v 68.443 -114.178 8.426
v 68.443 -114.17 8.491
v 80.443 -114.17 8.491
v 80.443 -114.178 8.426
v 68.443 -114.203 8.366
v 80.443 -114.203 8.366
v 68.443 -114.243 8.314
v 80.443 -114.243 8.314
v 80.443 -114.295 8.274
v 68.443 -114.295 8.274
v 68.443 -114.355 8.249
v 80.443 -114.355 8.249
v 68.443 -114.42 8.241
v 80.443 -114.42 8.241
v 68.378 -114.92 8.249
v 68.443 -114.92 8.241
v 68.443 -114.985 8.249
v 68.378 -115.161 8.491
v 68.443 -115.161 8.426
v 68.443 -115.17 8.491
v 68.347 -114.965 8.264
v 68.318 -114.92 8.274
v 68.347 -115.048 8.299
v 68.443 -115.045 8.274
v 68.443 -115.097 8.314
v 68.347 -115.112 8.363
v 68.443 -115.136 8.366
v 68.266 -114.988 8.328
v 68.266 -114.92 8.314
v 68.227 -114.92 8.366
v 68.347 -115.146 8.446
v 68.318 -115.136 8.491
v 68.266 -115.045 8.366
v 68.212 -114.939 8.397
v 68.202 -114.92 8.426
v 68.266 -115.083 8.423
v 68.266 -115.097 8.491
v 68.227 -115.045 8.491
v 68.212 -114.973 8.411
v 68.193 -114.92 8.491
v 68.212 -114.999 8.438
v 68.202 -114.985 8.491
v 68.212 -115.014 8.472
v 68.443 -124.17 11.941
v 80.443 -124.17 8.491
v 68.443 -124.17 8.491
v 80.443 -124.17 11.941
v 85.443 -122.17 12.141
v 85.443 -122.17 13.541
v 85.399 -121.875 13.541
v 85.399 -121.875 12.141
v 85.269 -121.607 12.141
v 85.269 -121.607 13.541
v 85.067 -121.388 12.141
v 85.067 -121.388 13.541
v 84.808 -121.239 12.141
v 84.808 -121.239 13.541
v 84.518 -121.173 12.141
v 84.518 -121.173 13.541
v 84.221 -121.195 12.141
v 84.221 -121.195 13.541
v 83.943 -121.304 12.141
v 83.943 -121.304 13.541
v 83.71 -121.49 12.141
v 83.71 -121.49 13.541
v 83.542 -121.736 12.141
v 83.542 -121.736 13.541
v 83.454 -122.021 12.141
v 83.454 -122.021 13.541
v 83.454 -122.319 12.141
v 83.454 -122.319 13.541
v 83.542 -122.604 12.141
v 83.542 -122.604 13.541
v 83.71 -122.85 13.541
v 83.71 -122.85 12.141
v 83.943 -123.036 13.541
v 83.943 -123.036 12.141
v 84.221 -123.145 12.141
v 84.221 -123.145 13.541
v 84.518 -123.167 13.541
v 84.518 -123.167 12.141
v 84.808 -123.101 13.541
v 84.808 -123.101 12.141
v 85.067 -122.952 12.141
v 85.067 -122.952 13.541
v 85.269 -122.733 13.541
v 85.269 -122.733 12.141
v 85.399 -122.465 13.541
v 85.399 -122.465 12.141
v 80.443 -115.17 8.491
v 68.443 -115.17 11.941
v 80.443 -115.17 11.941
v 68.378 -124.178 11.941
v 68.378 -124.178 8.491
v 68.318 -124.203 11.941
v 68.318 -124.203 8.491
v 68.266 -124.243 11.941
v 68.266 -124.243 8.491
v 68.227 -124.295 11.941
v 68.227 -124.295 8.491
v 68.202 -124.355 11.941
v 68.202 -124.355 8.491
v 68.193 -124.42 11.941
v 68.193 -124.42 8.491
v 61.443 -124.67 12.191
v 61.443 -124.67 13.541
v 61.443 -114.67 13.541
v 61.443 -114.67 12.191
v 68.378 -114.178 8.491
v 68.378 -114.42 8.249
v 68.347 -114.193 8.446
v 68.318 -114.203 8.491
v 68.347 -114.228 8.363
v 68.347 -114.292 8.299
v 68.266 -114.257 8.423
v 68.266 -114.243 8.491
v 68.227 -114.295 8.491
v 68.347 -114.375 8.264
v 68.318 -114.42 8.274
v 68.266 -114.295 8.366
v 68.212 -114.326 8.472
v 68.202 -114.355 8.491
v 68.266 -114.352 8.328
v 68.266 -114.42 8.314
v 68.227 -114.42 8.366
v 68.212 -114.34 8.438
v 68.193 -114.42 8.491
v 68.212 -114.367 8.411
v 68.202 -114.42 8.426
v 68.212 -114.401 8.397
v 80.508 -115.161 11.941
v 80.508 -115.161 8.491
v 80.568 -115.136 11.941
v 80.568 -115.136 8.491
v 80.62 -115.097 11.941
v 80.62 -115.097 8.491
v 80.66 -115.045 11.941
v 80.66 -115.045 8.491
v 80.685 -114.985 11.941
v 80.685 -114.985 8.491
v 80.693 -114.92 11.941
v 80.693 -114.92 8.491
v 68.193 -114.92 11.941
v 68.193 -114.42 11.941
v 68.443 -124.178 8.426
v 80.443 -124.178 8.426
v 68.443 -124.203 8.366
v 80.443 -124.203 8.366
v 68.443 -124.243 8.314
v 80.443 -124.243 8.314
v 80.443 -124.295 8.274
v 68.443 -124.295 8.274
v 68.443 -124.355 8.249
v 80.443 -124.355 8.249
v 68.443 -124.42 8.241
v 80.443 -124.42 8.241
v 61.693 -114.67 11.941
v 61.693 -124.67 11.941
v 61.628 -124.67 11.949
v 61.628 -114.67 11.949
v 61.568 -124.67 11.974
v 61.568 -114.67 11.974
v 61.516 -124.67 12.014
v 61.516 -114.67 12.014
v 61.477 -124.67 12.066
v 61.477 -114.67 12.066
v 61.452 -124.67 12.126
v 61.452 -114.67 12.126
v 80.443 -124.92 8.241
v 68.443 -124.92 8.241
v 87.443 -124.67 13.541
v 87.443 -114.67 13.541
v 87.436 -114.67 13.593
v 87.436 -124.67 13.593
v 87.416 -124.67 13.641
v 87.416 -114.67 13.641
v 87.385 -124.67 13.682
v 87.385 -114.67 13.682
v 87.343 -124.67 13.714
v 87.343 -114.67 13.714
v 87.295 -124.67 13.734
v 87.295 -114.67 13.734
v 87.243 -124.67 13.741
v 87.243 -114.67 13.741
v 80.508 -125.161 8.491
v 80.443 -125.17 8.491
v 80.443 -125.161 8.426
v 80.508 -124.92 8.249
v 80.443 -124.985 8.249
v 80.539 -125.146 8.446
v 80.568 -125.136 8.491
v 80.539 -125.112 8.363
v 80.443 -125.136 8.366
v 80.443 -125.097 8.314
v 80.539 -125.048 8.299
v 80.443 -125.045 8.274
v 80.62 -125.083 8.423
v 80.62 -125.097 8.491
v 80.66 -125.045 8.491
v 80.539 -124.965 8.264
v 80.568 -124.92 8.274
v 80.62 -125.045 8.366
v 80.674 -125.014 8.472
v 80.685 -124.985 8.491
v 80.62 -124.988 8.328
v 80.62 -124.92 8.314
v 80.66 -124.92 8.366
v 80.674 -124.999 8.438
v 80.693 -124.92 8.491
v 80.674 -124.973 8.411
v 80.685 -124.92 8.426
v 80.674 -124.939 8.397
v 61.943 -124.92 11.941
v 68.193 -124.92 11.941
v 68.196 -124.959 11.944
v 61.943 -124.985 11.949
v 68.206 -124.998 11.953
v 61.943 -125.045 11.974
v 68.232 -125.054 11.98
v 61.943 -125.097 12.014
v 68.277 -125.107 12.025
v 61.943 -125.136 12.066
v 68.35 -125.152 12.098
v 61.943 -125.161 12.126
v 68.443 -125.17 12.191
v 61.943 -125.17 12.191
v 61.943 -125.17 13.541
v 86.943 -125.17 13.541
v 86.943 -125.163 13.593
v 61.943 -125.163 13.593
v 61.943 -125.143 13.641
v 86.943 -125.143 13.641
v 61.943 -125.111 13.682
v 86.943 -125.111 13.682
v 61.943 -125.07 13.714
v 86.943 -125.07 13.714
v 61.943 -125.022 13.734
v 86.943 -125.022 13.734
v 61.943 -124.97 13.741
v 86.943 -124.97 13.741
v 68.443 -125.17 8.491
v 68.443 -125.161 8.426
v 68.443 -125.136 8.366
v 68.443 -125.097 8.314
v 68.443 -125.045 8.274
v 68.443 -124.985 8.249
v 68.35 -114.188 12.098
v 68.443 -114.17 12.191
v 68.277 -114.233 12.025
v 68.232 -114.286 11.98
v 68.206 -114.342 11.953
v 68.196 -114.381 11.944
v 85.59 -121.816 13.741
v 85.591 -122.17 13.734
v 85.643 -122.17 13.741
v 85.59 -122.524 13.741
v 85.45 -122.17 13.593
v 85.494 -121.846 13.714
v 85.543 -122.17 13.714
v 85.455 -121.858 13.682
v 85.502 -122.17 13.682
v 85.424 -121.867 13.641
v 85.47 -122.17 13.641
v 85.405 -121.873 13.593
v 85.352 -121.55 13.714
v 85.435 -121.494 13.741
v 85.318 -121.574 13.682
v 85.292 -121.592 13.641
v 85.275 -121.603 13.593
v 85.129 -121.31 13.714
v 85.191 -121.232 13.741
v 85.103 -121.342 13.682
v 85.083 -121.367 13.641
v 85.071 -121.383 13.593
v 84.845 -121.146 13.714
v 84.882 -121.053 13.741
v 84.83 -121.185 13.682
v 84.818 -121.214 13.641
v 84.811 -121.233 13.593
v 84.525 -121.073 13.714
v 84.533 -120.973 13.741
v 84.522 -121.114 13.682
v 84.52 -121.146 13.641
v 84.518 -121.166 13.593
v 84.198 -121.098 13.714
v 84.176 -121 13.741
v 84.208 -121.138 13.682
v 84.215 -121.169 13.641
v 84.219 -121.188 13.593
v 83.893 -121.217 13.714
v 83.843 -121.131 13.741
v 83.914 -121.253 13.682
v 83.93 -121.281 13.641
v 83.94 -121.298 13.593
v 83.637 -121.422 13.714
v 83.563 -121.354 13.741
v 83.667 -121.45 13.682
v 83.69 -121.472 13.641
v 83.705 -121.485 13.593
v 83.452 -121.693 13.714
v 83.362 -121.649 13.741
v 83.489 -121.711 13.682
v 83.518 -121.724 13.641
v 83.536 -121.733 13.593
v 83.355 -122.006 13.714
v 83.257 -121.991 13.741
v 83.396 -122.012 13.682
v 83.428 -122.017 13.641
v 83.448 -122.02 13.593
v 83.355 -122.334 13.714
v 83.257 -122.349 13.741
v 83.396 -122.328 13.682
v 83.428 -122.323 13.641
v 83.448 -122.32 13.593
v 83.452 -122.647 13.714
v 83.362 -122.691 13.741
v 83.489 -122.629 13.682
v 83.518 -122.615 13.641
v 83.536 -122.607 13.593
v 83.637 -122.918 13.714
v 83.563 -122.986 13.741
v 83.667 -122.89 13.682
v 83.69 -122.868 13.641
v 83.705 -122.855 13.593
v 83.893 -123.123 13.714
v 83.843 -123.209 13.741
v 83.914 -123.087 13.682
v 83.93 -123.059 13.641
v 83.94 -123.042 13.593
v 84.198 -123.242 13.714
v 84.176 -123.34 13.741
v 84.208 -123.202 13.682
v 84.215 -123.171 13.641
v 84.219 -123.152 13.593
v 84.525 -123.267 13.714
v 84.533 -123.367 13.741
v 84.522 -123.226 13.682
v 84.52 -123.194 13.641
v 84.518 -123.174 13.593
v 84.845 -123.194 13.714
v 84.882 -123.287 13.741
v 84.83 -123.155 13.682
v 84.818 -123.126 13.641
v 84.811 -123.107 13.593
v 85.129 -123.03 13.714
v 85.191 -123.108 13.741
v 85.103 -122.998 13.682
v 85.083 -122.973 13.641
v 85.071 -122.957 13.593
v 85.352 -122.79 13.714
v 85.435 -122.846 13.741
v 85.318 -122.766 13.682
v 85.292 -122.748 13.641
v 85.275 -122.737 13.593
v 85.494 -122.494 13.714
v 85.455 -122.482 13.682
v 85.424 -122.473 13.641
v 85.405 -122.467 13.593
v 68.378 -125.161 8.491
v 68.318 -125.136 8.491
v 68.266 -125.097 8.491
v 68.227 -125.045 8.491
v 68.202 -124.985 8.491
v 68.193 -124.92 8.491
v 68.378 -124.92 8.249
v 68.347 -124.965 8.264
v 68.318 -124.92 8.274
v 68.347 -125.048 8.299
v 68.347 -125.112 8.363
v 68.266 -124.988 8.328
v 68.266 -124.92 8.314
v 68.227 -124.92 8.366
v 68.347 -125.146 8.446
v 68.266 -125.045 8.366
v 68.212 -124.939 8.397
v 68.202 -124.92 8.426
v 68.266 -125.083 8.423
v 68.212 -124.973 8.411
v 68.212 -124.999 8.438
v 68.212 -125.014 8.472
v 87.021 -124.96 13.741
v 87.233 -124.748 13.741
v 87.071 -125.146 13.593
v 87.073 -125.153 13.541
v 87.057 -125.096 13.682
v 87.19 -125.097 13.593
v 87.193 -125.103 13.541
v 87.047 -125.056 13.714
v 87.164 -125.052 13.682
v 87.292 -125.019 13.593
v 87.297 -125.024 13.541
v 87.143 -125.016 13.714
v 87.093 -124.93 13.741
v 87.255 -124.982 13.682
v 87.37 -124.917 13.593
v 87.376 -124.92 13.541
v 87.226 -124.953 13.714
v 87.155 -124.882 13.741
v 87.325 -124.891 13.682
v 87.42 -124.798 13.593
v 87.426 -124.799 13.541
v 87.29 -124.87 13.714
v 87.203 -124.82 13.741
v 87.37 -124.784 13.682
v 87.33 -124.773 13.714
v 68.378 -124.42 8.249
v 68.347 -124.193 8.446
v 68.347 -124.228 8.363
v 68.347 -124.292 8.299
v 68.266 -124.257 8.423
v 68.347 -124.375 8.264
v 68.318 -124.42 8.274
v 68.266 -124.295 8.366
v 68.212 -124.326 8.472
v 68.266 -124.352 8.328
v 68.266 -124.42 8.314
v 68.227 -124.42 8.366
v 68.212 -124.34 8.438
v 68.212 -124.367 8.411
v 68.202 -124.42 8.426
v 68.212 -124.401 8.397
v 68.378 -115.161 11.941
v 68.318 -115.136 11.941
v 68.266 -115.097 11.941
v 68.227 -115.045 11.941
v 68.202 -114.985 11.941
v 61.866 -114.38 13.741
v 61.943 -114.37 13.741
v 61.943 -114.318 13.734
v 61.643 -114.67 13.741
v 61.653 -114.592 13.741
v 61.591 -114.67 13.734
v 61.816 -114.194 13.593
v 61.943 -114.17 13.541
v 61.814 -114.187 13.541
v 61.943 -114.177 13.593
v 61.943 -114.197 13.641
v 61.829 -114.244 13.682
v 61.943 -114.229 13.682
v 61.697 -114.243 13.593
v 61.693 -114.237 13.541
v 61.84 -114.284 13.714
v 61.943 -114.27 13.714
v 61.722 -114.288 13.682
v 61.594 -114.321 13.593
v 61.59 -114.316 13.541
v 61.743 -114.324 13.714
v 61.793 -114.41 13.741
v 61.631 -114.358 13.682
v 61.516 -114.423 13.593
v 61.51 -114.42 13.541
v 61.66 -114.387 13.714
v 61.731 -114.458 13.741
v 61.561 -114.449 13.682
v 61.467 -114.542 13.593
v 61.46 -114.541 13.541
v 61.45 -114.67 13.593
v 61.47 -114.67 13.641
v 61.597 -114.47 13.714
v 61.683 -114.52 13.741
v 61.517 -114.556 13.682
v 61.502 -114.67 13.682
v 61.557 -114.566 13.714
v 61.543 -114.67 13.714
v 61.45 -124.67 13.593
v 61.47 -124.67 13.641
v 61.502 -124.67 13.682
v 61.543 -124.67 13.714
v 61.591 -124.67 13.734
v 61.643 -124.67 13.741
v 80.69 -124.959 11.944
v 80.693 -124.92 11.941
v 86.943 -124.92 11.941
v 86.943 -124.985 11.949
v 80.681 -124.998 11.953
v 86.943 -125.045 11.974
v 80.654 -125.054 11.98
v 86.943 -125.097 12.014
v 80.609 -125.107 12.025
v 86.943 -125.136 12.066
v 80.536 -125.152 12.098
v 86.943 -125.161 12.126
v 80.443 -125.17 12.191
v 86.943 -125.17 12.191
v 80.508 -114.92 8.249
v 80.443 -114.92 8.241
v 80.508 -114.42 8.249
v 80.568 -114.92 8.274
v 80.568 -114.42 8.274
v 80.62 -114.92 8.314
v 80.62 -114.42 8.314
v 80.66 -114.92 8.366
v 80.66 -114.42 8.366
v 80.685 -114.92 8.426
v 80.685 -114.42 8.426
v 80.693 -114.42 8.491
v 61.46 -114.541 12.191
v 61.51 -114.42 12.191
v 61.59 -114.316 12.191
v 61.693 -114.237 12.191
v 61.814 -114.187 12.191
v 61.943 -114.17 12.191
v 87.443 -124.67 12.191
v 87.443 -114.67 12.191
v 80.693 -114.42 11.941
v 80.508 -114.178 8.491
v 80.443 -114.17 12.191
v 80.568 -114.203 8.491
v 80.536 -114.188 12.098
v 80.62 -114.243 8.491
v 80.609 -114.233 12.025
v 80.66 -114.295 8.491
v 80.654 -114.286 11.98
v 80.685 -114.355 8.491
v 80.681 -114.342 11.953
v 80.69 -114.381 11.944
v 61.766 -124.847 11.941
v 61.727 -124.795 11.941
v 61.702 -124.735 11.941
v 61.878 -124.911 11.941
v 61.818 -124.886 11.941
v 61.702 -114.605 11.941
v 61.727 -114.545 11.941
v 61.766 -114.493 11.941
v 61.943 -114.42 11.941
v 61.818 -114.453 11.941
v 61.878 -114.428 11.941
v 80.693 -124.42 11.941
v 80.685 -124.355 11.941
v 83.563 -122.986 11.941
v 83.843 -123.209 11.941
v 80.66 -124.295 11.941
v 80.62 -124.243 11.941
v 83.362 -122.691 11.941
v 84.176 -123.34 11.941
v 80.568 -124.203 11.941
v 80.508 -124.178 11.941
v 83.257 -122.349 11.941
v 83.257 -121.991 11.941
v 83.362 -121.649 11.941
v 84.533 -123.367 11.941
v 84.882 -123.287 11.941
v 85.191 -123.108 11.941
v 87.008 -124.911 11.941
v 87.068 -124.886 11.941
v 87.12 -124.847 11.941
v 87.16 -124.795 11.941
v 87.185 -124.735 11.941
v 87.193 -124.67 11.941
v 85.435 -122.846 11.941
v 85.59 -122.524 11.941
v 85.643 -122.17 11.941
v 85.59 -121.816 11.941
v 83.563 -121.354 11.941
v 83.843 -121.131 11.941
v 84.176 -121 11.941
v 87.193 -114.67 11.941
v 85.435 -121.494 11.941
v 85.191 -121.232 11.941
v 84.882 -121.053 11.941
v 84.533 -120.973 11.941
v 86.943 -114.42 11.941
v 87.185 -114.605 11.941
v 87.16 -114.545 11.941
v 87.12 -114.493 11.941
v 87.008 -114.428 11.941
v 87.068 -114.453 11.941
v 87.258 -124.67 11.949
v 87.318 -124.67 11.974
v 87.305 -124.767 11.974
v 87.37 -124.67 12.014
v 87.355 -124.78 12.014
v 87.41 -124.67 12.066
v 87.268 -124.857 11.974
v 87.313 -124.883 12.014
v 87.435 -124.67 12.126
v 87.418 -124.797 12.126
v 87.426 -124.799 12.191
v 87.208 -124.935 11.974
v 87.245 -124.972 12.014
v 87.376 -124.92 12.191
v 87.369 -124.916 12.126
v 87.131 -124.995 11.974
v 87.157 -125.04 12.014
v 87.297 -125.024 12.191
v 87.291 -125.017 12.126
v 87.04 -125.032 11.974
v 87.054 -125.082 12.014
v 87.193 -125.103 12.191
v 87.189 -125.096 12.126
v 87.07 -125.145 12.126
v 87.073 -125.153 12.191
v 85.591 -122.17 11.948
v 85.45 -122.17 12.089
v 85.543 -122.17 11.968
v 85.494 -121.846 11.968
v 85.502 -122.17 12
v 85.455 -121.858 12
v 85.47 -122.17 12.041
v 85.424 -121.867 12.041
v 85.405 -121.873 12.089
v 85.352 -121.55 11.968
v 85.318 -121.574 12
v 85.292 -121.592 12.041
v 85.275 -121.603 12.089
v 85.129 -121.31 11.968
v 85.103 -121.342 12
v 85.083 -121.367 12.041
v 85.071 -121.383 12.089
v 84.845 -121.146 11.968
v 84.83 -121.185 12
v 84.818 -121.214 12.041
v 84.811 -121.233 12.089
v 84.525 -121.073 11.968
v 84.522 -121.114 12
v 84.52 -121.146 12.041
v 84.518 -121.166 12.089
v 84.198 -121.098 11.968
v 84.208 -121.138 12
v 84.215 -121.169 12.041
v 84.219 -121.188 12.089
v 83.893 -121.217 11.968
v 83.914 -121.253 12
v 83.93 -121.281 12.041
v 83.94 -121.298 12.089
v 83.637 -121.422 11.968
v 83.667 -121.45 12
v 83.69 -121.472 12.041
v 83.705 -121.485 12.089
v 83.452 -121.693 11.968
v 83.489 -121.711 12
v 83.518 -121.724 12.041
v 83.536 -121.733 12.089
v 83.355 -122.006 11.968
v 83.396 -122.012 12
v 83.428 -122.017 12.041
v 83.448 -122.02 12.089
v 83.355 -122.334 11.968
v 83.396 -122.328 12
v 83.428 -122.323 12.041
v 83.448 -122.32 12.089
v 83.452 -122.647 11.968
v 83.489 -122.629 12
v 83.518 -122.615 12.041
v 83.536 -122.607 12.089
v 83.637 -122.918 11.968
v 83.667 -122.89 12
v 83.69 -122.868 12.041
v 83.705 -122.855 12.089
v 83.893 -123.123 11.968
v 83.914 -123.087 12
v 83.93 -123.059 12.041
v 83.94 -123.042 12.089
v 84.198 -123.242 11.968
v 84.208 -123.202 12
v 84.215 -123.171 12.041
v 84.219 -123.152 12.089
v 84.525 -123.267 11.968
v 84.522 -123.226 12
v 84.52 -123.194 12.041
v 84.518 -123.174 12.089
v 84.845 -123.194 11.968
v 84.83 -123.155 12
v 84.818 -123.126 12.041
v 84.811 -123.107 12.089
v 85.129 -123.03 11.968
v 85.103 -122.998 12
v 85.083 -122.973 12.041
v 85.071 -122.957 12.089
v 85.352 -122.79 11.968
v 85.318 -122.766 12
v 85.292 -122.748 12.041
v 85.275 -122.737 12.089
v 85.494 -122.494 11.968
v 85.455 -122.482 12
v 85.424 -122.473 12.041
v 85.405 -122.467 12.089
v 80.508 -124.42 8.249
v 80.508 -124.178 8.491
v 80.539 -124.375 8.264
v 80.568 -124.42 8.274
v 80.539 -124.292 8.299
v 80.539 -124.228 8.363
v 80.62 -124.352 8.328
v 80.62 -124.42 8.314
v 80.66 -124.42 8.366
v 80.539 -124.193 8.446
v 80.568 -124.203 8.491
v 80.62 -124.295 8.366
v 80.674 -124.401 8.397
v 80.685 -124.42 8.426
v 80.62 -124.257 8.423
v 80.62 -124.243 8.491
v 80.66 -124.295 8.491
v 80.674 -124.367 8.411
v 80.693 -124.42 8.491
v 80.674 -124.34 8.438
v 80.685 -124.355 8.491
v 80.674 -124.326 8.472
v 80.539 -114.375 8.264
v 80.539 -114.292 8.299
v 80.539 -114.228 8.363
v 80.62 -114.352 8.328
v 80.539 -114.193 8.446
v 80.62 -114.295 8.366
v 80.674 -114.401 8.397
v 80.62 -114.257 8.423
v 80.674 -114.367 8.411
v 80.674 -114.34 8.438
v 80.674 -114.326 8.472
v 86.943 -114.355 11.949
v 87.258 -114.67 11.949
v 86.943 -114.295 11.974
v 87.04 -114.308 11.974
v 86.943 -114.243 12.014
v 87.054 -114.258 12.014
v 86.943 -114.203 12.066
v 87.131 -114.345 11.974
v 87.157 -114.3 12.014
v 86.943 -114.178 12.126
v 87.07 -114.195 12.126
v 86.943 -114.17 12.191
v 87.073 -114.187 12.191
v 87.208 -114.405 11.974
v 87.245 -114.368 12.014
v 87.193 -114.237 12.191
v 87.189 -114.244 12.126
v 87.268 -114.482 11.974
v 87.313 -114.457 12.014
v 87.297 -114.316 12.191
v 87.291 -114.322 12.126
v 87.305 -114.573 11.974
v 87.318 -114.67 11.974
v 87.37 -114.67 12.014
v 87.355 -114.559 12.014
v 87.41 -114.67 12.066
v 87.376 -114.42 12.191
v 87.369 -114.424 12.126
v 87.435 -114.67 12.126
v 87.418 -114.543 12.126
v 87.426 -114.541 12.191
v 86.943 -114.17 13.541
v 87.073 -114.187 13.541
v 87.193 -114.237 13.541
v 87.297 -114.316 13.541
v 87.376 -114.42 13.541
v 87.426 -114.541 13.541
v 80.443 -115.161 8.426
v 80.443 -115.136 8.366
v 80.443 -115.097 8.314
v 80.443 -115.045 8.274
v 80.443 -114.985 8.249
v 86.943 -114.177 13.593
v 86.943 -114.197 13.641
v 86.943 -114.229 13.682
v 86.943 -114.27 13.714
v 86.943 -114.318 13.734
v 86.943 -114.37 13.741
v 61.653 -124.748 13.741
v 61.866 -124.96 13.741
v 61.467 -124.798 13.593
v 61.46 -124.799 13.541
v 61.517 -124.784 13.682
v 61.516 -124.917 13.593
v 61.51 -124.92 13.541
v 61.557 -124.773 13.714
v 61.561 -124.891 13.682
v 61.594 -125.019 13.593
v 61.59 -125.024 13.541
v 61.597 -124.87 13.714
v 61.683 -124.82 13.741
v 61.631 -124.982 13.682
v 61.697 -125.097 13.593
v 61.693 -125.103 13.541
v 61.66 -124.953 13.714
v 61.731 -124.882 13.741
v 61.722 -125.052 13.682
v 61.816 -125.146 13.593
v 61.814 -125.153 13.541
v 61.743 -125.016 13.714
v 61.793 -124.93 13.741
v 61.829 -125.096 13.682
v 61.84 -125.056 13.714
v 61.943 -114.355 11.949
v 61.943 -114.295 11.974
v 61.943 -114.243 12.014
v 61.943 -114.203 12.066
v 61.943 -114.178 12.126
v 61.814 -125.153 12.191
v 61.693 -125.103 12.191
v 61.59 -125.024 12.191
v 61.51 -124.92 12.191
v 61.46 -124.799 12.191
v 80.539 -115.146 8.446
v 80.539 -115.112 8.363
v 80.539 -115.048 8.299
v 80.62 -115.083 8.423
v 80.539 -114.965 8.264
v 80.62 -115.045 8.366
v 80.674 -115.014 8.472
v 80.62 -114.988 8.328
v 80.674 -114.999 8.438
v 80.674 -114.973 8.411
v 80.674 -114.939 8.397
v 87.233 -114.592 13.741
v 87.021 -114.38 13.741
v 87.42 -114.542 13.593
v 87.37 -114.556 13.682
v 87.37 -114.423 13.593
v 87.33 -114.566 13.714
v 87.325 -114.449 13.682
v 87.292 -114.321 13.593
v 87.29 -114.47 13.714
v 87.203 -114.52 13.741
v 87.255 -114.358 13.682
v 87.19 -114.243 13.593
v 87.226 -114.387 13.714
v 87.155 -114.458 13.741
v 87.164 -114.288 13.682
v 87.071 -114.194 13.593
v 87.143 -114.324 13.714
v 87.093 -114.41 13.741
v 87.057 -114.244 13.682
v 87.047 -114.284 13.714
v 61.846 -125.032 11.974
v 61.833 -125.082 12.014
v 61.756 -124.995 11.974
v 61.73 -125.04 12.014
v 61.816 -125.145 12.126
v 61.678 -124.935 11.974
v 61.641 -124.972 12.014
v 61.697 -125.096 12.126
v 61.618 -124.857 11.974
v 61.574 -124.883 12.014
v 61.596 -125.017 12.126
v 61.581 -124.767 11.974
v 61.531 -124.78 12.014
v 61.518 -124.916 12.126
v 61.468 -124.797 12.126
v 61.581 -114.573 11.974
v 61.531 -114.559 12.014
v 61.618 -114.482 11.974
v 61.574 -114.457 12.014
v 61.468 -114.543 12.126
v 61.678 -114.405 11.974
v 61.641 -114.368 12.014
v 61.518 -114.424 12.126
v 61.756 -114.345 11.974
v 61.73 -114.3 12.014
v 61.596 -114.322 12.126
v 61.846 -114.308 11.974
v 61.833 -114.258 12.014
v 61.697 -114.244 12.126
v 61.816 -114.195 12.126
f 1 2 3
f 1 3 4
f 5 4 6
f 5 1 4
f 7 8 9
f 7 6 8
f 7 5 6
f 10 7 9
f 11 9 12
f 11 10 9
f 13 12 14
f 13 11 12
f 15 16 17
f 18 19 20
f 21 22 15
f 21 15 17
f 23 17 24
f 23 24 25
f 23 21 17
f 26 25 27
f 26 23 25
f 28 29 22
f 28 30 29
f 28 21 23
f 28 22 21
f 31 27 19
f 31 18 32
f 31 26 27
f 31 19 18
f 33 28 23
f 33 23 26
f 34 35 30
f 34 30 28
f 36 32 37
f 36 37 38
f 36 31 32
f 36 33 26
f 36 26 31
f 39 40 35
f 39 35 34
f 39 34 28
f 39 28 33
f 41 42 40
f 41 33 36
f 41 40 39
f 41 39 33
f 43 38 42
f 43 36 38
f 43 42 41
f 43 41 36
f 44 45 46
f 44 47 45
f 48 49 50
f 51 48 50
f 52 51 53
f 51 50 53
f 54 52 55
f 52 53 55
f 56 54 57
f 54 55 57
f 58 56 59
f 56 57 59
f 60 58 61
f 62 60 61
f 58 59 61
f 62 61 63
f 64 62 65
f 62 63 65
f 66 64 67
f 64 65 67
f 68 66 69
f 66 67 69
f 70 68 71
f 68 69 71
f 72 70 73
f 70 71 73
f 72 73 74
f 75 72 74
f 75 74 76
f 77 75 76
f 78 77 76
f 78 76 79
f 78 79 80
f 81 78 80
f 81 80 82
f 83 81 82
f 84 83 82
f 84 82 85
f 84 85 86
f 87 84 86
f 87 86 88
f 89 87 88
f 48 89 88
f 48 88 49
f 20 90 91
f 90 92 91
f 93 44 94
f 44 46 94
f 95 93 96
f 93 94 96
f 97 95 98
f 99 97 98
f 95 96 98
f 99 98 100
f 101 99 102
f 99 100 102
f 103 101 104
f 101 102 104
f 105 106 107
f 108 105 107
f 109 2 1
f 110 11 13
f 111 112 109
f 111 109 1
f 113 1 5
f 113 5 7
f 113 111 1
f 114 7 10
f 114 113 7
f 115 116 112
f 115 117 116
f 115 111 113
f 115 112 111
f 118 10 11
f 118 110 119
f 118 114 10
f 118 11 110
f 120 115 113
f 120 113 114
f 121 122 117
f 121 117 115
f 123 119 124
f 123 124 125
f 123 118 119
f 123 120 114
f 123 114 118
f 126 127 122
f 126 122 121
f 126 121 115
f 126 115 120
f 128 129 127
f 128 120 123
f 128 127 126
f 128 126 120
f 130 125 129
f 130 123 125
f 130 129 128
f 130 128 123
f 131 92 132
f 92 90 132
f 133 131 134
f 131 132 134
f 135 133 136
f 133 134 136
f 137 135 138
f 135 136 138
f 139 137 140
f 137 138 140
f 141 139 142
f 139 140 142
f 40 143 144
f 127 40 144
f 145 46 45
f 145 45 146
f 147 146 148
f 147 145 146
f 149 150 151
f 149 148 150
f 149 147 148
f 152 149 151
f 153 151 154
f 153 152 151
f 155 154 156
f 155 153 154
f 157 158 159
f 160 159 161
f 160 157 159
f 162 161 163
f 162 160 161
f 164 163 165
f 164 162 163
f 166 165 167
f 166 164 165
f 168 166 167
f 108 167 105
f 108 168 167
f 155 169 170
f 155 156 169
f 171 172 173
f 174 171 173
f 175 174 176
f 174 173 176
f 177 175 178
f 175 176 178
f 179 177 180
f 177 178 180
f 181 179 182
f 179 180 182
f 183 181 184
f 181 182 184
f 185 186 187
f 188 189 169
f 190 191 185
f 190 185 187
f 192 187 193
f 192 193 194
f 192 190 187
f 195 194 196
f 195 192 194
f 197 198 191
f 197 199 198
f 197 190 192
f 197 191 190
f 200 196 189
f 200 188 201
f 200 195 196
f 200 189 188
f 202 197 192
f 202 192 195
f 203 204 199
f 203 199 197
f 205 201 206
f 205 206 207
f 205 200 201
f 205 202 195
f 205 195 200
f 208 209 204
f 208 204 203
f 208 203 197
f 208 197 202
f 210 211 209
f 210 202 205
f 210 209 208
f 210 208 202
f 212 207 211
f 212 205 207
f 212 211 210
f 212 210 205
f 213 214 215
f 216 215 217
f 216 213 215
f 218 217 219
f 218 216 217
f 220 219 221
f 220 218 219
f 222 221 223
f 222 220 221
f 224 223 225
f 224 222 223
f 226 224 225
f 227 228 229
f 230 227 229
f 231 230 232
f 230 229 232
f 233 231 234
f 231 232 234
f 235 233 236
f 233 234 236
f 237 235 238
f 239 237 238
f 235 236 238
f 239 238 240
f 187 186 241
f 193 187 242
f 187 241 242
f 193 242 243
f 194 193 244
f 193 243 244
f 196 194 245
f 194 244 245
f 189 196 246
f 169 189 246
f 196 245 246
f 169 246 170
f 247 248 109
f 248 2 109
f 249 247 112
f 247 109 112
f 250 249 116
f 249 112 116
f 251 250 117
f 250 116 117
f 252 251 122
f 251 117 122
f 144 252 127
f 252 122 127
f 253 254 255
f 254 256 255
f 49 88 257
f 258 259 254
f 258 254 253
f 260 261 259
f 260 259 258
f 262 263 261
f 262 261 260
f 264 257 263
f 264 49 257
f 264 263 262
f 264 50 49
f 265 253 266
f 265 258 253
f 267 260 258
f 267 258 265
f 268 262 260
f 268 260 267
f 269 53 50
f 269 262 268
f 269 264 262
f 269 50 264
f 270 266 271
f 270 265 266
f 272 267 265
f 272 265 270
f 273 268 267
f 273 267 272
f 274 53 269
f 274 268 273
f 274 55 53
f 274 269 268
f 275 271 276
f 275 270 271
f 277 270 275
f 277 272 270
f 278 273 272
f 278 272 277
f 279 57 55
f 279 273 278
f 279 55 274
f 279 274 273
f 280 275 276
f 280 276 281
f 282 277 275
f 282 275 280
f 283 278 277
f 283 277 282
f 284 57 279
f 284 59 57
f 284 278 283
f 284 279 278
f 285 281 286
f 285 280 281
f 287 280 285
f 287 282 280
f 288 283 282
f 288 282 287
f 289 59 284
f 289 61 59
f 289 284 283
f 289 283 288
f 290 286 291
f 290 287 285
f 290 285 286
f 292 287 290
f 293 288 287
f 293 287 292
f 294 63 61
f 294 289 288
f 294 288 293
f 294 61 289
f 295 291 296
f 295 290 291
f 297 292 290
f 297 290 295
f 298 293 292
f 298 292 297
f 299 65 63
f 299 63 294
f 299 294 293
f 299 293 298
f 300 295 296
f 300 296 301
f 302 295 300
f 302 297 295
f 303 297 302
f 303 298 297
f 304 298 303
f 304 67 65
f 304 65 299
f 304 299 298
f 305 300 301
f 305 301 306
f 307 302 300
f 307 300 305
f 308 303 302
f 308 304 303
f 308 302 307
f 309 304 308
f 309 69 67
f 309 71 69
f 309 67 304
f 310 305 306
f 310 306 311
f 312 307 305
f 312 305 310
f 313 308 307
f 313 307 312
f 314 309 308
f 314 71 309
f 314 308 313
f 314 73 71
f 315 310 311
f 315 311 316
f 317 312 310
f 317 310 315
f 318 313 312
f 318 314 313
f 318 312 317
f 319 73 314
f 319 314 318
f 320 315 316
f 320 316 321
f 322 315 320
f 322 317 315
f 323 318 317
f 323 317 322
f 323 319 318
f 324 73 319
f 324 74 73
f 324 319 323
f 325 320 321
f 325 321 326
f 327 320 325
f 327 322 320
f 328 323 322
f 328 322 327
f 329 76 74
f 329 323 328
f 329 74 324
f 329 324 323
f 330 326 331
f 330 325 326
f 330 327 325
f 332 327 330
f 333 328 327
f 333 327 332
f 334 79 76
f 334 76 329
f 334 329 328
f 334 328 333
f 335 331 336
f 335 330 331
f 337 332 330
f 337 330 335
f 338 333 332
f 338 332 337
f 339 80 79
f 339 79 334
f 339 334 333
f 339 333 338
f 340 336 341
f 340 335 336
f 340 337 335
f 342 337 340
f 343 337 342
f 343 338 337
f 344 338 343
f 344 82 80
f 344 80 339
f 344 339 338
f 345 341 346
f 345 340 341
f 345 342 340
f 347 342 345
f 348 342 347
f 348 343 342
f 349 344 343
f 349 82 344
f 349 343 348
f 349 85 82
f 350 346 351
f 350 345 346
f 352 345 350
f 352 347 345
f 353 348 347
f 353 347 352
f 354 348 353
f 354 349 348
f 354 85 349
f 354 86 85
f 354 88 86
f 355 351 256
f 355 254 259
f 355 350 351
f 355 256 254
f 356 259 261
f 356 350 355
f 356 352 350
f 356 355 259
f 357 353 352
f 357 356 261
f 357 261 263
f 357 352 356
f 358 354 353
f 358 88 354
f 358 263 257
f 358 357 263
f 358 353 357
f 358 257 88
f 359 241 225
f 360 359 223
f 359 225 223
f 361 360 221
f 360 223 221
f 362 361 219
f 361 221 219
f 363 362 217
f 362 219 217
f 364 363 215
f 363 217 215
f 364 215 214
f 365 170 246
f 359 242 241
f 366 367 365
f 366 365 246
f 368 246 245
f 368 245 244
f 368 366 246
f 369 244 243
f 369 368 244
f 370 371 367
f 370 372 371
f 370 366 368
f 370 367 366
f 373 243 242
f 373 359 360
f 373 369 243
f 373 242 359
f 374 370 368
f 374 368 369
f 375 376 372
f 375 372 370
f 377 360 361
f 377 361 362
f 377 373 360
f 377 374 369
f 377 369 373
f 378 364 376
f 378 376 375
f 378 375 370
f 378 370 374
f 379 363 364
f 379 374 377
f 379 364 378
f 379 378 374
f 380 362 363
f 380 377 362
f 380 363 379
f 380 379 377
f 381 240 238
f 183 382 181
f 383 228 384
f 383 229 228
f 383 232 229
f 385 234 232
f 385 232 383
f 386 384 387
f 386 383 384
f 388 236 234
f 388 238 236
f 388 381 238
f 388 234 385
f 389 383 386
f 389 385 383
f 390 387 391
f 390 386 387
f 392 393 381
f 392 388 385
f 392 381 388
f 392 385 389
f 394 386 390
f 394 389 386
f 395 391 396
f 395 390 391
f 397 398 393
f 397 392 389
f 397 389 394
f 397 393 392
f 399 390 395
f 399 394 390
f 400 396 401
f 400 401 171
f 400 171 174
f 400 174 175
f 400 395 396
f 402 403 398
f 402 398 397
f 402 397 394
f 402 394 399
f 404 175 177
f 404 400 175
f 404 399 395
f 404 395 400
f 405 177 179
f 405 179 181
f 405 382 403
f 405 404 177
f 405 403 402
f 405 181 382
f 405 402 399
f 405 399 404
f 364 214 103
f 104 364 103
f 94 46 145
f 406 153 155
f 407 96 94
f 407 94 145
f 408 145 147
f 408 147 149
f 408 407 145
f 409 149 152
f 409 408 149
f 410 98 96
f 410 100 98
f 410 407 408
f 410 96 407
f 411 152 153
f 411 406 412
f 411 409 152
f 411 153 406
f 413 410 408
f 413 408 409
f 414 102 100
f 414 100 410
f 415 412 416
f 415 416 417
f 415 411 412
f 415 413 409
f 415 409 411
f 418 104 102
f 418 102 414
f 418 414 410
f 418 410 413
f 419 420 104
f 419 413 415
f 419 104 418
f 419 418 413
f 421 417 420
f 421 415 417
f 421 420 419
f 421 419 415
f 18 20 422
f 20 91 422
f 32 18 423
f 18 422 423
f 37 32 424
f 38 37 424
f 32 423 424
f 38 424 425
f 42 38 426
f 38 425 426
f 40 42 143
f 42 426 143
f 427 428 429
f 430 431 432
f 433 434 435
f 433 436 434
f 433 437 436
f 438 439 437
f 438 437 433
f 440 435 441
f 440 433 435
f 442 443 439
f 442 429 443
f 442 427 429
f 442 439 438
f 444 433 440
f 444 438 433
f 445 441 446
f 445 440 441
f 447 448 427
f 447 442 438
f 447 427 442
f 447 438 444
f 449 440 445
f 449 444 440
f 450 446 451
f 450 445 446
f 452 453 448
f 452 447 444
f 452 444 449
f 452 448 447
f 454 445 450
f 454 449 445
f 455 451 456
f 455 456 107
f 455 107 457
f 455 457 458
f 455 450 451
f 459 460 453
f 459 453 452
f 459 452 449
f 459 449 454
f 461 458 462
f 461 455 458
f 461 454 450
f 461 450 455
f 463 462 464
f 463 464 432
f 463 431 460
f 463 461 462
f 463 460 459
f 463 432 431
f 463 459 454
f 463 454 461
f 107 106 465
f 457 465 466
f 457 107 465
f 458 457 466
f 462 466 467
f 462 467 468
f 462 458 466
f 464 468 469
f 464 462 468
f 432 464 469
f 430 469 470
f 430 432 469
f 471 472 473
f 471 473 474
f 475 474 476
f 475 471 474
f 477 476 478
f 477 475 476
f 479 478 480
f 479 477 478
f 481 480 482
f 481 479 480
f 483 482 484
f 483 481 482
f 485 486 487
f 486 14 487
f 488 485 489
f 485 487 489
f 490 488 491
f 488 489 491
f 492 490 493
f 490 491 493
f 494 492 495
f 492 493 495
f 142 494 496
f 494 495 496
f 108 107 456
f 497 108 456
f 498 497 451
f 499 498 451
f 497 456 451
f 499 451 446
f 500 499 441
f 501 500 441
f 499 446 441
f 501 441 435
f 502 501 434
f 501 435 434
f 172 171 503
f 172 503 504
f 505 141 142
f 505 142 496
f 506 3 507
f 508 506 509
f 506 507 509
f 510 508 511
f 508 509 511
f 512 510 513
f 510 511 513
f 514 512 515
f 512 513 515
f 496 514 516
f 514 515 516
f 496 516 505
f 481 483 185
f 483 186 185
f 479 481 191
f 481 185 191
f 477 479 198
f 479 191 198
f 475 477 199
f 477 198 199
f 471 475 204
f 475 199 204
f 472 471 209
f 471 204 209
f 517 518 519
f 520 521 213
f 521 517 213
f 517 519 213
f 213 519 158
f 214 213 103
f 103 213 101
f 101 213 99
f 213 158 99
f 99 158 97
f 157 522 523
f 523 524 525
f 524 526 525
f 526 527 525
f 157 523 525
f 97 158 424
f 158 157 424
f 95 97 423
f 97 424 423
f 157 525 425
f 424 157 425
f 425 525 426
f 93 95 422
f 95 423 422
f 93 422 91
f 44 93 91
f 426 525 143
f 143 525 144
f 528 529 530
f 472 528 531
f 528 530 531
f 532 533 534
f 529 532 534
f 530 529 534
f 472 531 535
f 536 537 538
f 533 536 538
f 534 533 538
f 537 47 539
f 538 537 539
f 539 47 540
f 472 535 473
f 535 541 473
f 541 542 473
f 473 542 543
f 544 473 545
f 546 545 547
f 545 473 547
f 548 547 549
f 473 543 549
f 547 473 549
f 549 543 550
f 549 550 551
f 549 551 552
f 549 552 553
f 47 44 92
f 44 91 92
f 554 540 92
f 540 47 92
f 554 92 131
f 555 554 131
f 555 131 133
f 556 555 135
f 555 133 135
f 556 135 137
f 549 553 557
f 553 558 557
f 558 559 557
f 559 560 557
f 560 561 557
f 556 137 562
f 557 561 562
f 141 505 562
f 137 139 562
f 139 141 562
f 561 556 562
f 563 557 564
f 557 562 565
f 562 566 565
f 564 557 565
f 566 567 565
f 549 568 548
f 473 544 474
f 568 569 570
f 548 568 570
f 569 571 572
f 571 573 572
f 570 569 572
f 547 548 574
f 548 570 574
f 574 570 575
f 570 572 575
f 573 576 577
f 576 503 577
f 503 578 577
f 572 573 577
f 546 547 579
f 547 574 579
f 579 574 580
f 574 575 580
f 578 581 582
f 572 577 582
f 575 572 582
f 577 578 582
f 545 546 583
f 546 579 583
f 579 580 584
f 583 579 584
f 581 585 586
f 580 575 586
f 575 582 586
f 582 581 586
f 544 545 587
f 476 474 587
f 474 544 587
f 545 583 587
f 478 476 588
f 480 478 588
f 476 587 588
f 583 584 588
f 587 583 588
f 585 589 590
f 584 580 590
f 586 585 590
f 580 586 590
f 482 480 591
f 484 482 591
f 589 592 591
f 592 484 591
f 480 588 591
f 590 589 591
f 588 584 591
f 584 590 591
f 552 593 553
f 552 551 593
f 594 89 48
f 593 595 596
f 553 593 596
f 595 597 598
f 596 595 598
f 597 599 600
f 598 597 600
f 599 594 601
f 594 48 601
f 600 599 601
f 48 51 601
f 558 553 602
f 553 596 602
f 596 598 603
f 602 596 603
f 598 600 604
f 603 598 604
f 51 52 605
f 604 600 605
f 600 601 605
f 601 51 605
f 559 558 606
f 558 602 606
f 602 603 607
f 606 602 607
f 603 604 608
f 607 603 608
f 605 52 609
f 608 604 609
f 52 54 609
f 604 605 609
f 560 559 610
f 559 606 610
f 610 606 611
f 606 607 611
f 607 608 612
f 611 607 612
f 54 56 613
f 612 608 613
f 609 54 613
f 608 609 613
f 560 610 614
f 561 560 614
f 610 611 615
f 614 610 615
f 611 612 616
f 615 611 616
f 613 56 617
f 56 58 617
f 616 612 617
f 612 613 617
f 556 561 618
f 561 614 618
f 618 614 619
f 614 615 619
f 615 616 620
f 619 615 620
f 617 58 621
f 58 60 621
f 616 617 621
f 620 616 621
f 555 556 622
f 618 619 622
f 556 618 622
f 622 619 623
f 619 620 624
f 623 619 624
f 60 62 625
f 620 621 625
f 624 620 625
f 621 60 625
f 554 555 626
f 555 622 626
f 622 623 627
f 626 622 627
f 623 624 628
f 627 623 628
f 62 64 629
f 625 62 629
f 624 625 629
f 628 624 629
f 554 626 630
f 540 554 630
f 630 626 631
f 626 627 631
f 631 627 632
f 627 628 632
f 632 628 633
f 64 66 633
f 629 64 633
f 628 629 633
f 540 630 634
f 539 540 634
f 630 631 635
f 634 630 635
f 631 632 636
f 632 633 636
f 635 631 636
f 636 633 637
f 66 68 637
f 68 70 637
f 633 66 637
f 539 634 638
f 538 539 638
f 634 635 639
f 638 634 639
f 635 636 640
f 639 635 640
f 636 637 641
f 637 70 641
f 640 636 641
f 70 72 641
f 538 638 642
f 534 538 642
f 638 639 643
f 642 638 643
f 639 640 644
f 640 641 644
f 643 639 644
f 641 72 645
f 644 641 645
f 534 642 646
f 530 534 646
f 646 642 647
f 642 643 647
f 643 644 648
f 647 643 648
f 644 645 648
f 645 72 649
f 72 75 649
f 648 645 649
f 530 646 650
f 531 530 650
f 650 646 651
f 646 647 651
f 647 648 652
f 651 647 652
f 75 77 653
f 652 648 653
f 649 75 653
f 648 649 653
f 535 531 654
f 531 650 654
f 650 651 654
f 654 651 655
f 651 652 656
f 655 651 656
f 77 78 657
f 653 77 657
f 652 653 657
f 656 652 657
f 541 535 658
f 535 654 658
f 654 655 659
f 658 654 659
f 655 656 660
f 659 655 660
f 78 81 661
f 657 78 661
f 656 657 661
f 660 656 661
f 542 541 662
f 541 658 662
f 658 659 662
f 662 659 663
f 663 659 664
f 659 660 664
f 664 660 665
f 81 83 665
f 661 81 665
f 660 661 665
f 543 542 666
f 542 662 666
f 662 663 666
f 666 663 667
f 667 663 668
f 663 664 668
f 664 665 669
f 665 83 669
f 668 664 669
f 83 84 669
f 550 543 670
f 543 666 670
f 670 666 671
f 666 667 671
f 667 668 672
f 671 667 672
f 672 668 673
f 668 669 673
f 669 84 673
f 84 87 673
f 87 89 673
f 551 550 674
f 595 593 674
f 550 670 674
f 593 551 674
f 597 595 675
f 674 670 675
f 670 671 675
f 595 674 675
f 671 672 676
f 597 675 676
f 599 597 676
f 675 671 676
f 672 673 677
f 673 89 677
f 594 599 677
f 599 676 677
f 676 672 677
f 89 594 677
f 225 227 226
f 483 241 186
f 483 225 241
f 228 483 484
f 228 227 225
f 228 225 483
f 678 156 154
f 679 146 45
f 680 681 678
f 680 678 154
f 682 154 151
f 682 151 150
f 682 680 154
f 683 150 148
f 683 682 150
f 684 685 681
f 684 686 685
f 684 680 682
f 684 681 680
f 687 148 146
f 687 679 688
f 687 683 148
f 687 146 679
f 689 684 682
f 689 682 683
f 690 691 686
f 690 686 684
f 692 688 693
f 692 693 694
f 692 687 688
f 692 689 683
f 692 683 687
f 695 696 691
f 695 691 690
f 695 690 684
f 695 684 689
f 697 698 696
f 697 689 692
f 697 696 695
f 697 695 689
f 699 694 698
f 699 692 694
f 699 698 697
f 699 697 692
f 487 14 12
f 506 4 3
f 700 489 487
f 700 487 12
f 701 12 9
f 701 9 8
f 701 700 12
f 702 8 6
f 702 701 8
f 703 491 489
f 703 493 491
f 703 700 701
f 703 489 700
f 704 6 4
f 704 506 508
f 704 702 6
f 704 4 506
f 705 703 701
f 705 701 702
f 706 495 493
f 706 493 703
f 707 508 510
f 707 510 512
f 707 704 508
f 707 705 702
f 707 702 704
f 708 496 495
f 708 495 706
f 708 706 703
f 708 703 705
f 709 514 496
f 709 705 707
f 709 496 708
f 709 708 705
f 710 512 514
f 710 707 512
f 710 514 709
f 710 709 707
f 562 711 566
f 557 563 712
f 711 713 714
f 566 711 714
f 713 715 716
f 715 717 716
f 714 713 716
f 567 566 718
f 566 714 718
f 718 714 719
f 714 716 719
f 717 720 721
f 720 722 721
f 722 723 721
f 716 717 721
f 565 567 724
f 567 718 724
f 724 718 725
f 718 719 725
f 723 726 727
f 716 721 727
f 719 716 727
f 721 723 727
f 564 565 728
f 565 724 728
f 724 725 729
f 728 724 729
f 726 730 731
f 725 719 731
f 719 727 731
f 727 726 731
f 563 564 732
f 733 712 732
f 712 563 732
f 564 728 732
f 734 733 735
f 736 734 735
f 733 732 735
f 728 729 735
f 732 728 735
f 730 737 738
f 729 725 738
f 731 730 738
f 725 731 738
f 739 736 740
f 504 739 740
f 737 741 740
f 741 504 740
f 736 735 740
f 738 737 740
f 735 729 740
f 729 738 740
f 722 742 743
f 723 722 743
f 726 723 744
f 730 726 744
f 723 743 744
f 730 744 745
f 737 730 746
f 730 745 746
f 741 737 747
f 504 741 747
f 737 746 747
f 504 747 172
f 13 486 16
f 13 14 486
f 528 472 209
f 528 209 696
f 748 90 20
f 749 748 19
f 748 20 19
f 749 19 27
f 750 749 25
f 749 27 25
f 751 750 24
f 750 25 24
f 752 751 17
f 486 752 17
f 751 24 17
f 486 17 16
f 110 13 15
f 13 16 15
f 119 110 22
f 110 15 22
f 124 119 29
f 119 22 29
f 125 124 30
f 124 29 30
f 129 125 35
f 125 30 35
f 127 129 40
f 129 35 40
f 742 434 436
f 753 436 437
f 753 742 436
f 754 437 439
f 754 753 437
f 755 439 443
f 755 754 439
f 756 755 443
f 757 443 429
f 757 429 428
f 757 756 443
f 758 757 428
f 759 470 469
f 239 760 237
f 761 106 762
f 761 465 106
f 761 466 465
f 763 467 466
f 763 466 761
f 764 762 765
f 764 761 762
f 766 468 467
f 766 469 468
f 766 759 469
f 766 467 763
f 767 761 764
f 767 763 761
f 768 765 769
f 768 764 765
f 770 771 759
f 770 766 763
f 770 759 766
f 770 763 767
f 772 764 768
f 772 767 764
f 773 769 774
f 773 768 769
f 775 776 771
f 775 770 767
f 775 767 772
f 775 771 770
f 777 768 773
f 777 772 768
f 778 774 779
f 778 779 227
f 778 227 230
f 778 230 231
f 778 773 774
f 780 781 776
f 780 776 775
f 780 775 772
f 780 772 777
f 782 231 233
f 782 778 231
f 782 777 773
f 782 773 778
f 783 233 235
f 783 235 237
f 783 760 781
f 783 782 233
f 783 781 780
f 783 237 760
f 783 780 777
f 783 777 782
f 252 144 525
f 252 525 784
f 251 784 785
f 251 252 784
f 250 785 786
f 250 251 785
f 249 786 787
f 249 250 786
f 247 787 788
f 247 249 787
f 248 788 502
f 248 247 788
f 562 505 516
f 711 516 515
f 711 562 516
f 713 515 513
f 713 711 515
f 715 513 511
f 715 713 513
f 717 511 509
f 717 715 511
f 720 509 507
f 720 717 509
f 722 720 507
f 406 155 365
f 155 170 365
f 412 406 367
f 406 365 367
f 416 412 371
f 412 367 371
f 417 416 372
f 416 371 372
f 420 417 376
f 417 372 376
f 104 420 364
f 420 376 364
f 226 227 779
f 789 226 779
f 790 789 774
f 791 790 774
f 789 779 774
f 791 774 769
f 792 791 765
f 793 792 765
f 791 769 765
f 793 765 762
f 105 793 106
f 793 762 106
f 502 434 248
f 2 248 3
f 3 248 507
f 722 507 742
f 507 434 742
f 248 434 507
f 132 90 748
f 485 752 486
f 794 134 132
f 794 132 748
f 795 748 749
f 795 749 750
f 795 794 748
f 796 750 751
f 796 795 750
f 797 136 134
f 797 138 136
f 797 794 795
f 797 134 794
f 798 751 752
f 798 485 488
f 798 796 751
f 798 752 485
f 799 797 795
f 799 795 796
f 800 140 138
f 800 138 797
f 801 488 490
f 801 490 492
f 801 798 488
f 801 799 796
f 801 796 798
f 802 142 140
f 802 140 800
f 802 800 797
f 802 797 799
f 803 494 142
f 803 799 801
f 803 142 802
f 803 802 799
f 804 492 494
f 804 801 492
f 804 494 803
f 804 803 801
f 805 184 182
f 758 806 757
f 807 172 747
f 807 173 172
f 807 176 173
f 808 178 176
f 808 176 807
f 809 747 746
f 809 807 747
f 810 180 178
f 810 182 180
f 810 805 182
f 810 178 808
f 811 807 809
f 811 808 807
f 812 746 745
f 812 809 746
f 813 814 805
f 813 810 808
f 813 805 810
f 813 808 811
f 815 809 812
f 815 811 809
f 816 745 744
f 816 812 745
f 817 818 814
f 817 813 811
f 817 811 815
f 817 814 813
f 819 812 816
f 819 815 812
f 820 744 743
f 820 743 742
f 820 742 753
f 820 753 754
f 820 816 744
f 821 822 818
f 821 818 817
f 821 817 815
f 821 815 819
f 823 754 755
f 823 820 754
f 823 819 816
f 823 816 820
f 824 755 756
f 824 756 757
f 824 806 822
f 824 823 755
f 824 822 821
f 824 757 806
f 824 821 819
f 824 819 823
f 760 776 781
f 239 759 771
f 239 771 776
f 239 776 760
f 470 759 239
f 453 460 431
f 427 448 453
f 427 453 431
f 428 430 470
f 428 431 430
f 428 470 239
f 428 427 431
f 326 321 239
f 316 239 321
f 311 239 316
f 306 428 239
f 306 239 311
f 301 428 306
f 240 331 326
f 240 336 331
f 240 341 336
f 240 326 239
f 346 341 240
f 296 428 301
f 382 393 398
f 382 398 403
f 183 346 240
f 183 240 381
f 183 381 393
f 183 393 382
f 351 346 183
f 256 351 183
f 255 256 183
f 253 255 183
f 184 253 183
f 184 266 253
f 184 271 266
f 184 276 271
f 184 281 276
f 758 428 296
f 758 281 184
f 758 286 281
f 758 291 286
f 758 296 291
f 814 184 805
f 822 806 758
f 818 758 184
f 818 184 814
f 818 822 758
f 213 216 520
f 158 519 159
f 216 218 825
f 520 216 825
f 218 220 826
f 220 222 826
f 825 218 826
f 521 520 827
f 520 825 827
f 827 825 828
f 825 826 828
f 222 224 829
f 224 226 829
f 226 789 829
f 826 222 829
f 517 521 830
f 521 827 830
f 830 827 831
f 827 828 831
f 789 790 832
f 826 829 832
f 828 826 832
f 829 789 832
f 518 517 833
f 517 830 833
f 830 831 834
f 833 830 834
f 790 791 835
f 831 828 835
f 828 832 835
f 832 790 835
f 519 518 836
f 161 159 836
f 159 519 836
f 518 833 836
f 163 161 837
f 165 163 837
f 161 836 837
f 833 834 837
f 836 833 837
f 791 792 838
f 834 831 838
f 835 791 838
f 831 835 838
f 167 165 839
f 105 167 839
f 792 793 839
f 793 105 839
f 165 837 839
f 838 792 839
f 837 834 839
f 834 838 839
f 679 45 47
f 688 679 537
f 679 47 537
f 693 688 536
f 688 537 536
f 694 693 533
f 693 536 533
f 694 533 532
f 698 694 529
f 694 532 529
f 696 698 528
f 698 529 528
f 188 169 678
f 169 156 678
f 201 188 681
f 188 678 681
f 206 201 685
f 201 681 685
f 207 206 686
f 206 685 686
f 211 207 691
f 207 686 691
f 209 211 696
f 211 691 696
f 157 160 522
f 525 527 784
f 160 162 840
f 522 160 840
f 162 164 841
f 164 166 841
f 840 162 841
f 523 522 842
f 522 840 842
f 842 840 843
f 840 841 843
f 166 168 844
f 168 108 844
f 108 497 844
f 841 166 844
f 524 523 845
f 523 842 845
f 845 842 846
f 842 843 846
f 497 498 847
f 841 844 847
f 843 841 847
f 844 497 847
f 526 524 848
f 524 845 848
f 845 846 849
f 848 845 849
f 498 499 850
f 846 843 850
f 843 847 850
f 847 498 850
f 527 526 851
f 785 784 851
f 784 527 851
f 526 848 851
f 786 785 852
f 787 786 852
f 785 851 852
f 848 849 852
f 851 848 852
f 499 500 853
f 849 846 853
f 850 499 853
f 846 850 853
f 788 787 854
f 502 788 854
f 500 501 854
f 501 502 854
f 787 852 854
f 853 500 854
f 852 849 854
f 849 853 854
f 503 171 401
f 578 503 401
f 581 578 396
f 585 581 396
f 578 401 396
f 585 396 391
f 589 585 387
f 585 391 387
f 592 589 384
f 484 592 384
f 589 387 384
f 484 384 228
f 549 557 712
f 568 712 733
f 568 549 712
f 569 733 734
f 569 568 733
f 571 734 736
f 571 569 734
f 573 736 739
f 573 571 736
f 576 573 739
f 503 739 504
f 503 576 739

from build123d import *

# Parameters (mm, degrees)
SKETCH1_W           = 26
SKETCH1_H           = 11
BOSS_EXTRUDE1_DEPTH = 1.8
FILLET1_R           = 0.2
SKETCH2_R           = 1
CUT_EXTRUDE1_DEPTH  = 153.699256387
FILLET2_R           = 0.5
FILLET3_R           = 0.2
SKETCH4_W           = 12.5
SKETCH4_H           = 1
BOSS_EXTRUDE2_DEPTH = 3.7
FILLET4_R           = 0.25
FILLET5_R           = 0.25


with BuildPart() as part:
    # Sketch1 → Boss-Extrude1 (new body)
    with BuildSketch(Plane.XY.offset(13.74095281)):
        with Locations((74.443158301, -119.669952335)):
            Rectangle(SKETCH1_W, SKETCH1_H)
    extrude(amount=-BOSS_EXTRUDE1_DEPTH)

    # Fillet1
    fillet1_edges = [part.edges().sort_by_distance(p)[0] for p in [
        (87.443158301, -119.669952335, 13.74095281),
        (74.443158301, -114.169952335, 13.74095281),
        (61.443158301, -119.669952335, 13.74095281),
        (74.443158301, -125.169952335, 13.74095281),
    ]]
    fillet(fillet1_edges, radius=FILLET1_R)

    # Sketch2 → Cut-Extrude1 (cut, through all)
    with BuildSketch(Plane.XY.offset(13.74095281)):
        with Locations((84.443158301, -122.169952335)):
            Circle(SKETCH2_R)
    extrude(amount=-CUT_EXTRUDE1_DEPTH, mode=Mode.SUBTRACT)

    # Fillet2
    # the kernel refuses this fillet: 0.5 mm, written as the material it takes off along each edge
    with BuildSketch(Plane(origin=(86.943158301, -124.669952335, 13.74095281), x_dir=(0, -1, 0), z_dir=(-1, 0, 0))) as fillet2_piece_1:
        with BuildLine():
            CenterArc((0.3, -0.2), 0.2, 0, 90)
            Line((0.5, -0.2), (0.5, 0))
            Line((0.5, 0), (0.3, 0))
        make_face()
    revolve(axis=Axis((86.943158301, -124.669952335, 13.74095281), (0, 0, 1)), revolution_arc=90, mode=Mode.SUBTRACT)
    with BuildSketch(Plane(origin=(61.943158301, -124.669952335, 13.74095281), x_dir=(-1, 0, 0), z_dir=(0, 1, 0))) as fillet2_piece_2:
        with BuildLine():
            CenterArc((0.3, -0.2), 0.2, 0, 90)
            Line((0.5, -0.2), (0.5, 0))
            Line((0.5, 0), (0.3, 0))
        make_face()
    revolve(axis=Axis((61.943158301, -124.669952335, 13.74095281), (0, 0, 1)), revolution_arc=90, mode=Mode.SUBTRACT)
    with BuildSketch(Plane(origin=(86.943158301, -114.669952335, 13.74095281), x_dir=(1, 0, 0), z_dir=(0, -1, 0))) as fillet2_piece_3:
        with BuildLine():
            CenterArc((0.3, -0.2), 0.2, 0, 90)
            Line((0.5, -0.2), (0.5, 0))
            Line((0.5, 0), (0.3, 0))
        make_face()
    revolve(axis=Axis((86.943158301, -114.669952335, 13.74095281), (0, 0, 1)), revolution_arc=90, mode=Mode.SUBTRACT)
    with BuildSketch(Plane(origin=(61.943158301, -114.669952335, 13.74095281), x_dir=(0, 1, 0), z_dir=(1, 0, 0))) as fillet2_piece_4:
        with BuildLine():
            CenterArc((0.3, -0.2), 0.2, 0, 90)
            Line((0.5, -0.2), (0.5, 0))
            Line((0.5, 0), (0.3, 0))
        make_face()
    revolve(axis=Axis((61.943158301, -114.669952335, 13.74095281), (0, 0, 1)), revolution_arc=90, mode=Mode.SUBTRACT)
    with BuildSketch(Plane(origin=(87.443158301, -125.169952335, 13.74095281), x_dir=(-1, 0, 0), z_dir=(0, 0, -1)), Plane(origin=(87.443158301, -114.169952335, 13.74095281), x_dir=(0, -1, 0), z_dir=(0, 0, -1))) as fillet2_piece_5:
        with BuildLine():
            CenterArc((FILLET2_R, FILLET2_R), FILLET2_R, 180, 90)
            Line((0, FILLET2_R), (0, 0))
            Line((0, 0), (FILLET2_R, 0))
        make_face()
    extrude(amount=3.05, mode=Mode.SUBTRACT)
    with BuildSketch(Plane(origin=(61.443158301, -114.169952335, 13.74095281), x_dir=(0, -1, 0), z_dir=(0, 0, -1)), Plane(origin=(61.443158301, -125.169952335, 13.74095281), x_dir=(1, 0, 0), z_dir=(0, 0, -1))) as fillet2_piece_6:
        with BuildLine():
            CenterArc((FILLET2_R, -FILLET2_R), FILLET2_R, 90, 90)
            Line((0, -FILLET2_R), (0, 0))
            Line((0, 0), (FILLET2_R, 0))
        make_face()
    extrude(amount=3.05, mode=Mode.SUBTRACT)

    # Fillet3
    fillet3_edges = [part.edges().sort_by_distance(p)[0] for p in [
        (83.443158301, -122.169952335, 11.94095281),
        (83.443158301, -122.169952335, 13.74095281),
    ]]
    fillet(fillet3_edges, radius=FILLET3_R)

    # Sketch4 → Boss-Extrude2 (add)
    with BuildSketch(Plane(origin=(0, 0, 11.94095281), x_dir=(-1, 0, 0), z_dir=(0, 0, -1))):
        with Locations((-74.443158301, -124.669952335)):
            Rectangle(SKETCH4_W, SKETCH4_H)
        with Locations((-74.443158301, -114.669952335)):
            Rectangle(SKETCH4_W, SKETCH4_H)
    extrude(amount=BOSS_EXTRUDE2_DEPTH)

    # Fillet4
    fillet4_edges = [part.edges().sort_by_distance(p)[0] for p in [
        (61.443158301, -119.669952335, 11.94095281),
        (65.068158301, -125.169952335, 11.94095281),
        (83.818158301, -114.169952335, 11.94095281),
        (87.443158301, -119.669952335, 11.94095281),
        (87.296711691, -125.023505725, 11.94095281),
        (87.296711691, -114.316398944, 11.94095281),
        (61.58960491, -114.316398944, 11.94095281),
        (61.58960491, -125.023505725, 11.94095281),
        (83.818158301, -125.169952335, 11.94095281),
        (65.068158301, -114.169952335, 11.94095281),
        (74.443158301, -125.169952335, 8.24095281),
        (74.443158301, -124.169952335, 8.24095281),
        (74.443158301, -114.169952335, 8.24095281),
        (74.443158301, -115.169952335, 8.24095281),
    ]]
    fillet(fillet4_edges, radius=FILLET4_R)

    # Fillet5
    fillet5_edges = [part.edges().sort_by_distance(p)[0] for p in [
        (68.193158301, -114.169952335, 10.34095281),
        (68.193158301, -114.243175639, 8.314176115),
        (68.193158301, -115.169952335, 10.21595281),
        (68.193158301, -115.09672903, 8.314176115),
        (68.193158301, -125.169952335, 10.34095281),
        (68.193158301, -125.09672903, 8.314176115),
        (68.193158301, -124.169952335, 10.21595281),
        (68.193158301, -124.243175639, 8.314176115),
        (80.693158301, -125.169952335, 10.34095281),
        (80.693158301, -125.09672903, 8.314176115),
        (80.693158301, -124.169952335, 10.21595281),
        (80.693158301, -124.243175639, 8.314176115),
        (80.693158301, -114.169952335, 10.34095281),
        (80.693158301, -114.243175639, 8.314176115),
        (80.693158301, -115.169952335, 10.21595281),
        (80.693158301, -115.09672903, 8.314176115),
        (68.193158301, -114.669952335, 8.24095281),
        (68.193158301, -124.669952335, 8.24095281),
        (80.693158301, -124.669952335, 8.24095281),
        (80.693158301, -114.669952335, 8.24095281),
    ]]
    fillet(fillet5_edges, radius=FILLET5_R)


solid = part.part
